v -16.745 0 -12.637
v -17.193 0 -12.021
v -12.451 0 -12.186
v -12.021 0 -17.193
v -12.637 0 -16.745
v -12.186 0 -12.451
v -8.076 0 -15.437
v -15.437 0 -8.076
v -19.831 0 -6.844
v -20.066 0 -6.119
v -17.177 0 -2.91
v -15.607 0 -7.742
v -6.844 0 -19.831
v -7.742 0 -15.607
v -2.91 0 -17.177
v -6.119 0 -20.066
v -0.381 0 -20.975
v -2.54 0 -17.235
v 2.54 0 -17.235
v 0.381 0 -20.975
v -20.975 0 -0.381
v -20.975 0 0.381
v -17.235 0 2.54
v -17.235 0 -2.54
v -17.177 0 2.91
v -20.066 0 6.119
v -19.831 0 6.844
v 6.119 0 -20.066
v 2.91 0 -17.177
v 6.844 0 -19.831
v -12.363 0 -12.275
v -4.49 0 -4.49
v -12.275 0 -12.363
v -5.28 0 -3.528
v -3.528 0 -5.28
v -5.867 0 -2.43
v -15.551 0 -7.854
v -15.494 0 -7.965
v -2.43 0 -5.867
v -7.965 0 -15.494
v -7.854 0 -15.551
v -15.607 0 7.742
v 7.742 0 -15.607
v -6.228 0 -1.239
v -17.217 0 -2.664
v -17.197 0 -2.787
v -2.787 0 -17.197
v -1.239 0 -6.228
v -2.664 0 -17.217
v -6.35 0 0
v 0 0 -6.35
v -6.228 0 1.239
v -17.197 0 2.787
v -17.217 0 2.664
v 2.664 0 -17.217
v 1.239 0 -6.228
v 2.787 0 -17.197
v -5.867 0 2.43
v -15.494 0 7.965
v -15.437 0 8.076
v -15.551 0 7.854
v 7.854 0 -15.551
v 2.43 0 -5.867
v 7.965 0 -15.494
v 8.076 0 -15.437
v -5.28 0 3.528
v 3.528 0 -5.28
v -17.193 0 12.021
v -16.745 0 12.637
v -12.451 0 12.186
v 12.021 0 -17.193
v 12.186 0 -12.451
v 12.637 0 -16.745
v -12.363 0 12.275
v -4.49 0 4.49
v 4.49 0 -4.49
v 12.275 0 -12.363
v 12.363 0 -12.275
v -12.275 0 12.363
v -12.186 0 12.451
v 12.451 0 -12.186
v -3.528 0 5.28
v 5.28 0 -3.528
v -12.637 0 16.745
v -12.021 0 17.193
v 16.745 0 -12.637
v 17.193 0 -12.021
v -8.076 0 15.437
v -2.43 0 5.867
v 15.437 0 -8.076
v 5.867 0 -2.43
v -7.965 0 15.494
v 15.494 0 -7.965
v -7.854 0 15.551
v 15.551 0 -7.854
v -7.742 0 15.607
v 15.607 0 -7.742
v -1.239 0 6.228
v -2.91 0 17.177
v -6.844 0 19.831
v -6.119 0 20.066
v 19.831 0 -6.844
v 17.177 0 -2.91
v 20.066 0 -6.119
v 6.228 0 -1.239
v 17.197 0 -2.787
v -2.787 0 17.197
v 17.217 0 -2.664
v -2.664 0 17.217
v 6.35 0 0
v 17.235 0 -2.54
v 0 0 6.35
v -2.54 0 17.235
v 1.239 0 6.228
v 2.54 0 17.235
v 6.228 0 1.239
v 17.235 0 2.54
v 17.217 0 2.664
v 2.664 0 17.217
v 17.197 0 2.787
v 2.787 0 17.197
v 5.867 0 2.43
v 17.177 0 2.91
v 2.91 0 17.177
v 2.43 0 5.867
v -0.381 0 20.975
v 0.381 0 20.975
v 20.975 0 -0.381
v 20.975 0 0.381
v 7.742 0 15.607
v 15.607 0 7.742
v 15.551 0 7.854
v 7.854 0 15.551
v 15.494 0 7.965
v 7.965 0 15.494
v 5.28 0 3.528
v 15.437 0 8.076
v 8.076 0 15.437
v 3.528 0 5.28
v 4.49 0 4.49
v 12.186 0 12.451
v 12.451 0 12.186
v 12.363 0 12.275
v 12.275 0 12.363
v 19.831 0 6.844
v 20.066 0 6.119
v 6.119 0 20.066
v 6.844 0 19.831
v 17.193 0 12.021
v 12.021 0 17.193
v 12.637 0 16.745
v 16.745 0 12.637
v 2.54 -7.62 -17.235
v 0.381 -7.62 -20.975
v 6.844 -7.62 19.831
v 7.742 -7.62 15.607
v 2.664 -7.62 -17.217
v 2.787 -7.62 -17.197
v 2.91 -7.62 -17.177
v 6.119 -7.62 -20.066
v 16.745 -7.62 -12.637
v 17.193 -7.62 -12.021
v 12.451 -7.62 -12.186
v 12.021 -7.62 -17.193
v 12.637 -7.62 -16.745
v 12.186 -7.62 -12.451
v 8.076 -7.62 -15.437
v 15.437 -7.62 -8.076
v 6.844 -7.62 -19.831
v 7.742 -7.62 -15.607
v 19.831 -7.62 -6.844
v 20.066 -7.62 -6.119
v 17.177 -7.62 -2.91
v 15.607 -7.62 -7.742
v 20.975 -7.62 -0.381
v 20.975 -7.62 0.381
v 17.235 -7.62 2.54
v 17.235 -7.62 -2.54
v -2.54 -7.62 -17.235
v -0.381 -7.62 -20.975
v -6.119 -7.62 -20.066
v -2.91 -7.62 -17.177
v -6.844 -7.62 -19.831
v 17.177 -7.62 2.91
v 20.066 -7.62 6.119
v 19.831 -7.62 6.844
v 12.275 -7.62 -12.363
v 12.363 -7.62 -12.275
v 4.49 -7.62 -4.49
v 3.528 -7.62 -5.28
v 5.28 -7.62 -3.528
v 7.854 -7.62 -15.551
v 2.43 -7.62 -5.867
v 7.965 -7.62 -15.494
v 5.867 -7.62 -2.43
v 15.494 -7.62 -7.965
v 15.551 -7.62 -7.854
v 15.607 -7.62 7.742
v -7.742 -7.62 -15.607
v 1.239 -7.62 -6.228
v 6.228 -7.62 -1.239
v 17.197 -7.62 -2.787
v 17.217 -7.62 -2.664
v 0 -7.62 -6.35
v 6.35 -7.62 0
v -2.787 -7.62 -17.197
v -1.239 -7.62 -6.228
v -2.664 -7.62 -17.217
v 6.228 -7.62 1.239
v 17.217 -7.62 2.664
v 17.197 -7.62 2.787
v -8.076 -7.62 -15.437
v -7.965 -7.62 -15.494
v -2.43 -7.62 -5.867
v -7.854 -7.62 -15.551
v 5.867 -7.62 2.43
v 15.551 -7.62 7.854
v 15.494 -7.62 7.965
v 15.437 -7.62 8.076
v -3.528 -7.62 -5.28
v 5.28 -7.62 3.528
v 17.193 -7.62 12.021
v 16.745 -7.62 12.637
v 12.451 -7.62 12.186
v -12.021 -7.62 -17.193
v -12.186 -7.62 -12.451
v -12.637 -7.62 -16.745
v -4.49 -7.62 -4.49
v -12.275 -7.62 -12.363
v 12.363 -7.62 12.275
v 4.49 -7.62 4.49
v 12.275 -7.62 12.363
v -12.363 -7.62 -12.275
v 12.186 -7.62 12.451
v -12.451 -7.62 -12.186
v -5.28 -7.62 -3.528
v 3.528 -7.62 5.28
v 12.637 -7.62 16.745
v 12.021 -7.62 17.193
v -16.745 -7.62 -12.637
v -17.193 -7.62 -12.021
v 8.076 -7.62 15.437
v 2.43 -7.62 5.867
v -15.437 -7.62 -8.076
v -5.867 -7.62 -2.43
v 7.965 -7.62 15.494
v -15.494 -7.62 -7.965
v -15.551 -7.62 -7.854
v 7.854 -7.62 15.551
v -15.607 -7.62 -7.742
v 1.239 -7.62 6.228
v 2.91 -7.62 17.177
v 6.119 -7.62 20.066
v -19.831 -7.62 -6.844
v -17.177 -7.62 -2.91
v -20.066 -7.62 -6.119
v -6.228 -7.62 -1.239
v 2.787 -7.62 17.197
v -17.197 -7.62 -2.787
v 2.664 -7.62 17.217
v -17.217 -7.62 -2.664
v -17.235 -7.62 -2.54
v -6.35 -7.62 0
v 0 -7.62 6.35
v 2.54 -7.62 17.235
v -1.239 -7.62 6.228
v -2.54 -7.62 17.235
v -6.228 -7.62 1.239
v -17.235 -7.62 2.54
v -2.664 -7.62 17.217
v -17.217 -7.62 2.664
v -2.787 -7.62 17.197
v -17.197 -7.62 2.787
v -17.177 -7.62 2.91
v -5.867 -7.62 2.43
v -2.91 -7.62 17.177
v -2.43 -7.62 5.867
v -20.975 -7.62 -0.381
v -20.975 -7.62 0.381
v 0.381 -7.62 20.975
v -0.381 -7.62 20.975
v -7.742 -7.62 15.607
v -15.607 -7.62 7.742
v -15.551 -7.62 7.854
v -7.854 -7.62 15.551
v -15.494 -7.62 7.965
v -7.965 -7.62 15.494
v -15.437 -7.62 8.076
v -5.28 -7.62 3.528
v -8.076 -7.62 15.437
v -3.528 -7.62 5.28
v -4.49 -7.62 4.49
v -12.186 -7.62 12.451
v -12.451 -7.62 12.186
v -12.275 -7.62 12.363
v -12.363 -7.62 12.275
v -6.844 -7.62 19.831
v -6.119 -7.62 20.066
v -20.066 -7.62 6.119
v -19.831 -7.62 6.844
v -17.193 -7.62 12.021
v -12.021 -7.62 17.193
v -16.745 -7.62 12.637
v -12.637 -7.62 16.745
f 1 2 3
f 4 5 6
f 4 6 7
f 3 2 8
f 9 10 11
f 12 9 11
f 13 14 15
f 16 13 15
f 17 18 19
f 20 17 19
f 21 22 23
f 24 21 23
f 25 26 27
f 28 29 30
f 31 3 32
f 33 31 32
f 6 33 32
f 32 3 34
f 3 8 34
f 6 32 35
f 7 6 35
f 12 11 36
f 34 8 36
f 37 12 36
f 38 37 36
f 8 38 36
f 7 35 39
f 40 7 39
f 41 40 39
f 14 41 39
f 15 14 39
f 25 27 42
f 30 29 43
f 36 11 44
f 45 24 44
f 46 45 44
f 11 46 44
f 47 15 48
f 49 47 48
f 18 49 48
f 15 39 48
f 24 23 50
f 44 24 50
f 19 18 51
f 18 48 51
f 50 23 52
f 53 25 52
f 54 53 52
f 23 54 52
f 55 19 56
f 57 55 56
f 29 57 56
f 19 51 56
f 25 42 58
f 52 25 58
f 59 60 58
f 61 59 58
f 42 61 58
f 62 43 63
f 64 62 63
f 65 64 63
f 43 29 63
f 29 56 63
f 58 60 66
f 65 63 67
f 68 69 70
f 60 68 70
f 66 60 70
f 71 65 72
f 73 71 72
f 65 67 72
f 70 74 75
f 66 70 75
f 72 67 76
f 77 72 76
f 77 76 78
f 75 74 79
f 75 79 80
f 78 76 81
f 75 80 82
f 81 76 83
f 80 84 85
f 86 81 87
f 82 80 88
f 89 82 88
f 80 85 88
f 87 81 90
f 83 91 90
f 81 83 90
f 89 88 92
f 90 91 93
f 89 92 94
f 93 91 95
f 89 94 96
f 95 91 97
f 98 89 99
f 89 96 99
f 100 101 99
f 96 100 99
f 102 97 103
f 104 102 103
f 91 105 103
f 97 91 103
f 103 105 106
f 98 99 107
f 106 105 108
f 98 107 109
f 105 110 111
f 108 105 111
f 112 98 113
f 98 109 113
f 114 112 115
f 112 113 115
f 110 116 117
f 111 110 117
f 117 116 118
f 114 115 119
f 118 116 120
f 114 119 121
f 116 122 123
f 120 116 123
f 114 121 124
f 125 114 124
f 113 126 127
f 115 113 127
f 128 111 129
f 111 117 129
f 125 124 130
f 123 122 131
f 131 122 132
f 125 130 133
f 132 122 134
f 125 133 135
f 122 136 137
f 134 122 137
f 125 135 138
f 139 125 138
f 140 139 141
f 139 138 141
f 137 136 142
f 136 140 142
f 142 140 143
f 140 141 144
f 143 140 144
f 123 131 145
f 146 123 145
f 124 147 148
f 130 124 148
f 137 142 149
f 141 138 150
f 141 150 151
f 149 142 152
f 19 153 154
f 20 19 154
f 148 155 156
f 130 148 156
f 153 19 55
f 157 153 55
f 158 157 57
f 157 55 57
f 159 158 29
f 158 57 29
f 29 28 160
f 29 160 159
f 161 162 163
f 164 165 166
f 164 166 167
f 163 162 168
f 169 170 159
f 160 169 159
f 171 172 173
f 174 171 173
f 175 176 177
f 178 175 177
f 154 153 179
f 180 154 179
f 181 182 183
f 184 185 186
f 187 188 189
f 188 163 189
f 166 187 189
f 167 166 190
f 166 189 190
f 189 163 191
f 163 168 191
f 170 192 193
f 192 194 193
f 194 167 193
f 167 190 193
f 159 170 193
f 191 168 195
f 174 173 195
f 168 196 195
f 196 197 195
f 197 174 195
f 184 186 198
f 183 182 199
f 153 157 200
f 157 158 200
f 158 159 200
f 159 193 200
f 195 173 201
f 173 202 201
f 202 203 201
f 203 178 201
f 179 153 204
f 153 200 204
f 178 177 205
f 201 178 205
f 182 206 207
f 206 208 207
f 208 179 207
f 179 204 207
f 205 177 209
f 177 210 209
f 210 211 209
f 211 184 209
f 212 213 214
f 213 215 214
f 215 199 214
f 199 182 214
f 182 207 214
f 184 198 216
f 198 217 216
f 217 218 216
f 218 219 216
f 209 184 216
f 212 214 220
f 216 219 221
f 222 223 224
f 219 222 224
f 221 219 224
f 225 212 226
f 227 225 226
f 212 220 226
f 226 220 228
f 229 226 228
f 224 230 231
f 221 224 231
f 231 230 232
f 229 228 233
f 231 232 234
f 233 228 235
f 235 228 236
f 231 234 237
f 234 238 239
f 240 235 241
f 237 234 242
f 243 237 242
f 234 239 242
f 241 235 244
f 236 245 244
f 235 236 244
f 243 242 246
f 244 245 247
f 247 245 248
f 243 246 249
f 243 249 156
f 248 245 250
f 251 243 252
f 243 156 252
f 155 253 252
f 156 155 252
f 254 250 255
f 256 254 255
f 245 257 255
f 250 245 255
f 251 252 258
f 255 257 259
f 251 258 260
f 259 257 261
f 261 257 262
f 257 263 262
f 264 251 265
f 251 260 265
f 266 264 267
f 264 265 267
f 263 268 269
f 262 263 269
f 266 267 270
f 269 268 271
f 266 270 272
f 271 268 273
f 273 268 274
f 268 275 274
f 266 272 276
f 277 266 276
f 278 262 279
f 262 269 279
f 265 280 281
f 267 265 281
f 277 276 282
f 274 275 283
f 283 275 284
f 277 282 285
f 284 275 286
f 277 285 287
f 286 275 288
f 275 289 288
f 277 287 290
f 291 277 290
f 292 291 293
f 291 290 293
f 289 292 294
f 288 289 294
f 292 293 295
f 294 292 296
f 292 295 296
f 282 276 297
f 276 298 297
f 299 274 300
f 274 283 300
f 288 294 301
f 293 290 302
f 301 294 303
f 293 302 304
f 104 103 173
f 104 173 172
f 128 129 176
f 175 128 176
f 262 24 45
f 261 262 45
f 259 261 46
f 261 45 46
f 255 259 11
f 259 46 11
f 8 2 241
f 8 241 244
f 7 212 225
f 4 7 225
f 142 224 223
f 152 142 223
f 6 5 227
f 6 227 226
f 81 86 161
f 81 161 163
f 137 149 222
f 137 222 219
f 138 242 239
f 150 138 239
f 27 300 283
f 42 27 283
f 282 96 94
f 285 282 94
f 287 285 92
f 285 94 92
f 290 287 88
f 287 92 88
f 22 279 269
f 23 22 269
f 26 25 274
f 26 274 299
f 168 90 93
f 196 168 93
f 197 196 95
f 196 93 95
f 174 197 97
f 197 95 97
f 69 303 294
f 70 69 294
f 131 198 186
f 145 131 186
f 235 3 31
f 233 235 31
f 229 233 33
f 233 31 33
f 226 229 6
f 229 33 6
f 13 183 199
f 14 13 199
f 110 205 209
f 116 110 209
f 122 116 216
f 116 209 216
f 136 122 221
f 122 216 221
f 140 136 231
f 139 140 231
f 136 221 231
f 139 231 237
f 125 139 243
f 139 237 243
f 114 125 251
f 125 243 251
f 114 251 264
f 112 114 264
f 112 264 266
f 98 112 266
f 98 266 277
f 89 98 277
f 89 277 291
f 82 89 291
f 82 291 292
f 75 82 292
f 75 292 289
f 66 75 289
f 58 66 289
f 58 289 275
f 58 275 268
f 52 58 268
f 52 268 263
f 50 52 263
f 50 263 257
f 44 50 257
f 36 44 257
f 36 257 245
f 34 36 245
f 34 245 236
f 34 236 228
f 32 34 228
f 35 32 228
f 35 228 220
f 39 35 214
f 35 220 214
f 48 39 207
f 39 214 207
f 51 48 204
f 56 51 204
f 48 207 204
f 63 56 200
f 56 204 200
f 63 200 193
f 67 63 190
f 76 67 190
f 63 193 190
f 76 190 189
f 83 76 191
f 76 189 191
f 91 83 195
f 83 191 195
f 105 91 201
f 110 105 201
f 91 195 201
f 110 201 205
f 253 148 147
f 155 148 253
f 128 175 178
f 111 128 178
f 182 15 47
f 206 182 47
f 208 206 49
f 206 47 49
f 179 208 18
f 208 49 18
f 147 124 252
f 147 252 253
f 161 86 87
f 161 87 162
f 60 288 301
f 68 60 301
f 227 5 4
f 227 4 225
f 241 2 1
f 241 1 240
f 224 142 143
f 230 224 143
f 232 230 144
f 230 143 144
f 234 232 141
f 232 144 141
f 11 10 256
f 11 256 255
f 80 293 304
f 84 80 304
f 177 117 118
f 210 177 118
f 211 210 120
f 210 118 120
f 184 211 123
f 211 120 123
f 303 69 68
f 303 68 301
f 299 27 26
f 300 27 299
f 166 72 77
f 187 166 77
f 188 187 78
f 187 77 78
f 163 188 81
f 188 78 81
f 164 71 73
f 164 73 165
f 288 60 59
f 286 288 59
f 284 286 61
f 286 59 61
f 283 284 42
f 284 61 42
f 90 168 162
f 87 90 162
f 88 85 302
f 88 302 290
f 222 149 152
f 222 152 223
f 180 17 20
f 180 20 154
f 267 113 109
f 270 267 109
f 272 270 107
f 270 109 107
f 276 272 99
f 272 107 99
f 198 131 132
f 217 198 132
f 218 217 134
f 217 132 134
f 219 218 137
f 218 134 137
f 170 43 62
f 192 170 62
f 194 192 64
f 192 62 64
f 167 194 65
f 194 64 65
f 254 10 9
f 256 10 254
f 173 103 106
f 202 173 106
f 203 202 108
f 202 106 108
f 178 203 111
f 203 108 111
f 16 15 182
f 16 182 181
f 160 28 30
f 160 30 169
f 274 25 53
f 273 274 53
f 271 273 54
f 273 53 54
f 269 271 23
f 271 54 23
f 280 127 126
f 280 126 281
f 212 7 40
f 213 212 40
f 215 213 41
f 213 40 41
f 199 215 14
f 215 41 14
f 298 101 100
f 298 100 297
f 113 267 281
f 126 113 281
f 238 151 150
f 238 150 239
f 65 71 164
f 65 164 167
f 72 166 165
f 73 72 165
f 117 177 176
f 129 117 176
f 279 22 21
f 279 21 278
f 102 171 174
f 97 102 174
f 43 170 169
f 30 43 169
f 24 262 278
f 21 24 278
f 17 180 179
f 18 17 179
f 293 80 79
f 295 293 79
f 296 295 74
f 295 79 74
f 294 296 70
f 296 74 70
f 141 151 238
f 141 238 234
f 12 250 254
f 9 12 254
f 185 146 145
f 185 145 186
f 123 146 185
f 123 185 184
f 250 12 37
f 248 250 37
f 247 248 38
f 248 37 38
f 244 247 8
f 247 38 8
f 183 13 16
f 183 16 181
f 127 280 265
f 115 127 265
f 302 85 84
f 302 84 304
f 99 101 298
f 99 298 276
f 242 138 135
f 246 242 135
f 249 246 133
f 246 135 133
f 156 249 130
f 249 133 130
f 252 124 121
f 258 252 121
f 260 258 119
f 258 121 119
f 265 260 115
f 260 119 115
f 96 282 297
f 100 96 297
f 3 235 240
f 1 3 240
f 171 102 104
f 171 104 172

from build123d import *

# Parameters (mm, degrees)
F0_R     = 17.421619
F1_DEPTH = 7.62
F3_DEPTH = 7.62
F4_SIZE  = 0.762
F5_R     = 6.35
F6_DEPTH = 25.4


with BuildPart() as f1:
    # F0 (on Front) → F1 (new body)
    with BuildSketch(Plane.XZ):
        Circle(F0_R)
    extrude(amount=F1_DEPTH)

    # F2 (on face) → F3 (join, through all)
    with BuildSketch(Plane(origin=(0, 0, 0), x_dir=(-1, 0, 0), z_dir=(0, 1, 0))):
        Polygon((-17.235463, -2.54), (-17.235463, 2.54), (-21.634872, 0), align=None)
        Polygon((-20.575986, -6.685543), (-15.606996, -7.741735), (-17.176803, -2.910368), align=None)
        Polygon((-17.502979, -12.716659), (-12.450808, -12.185654), (-15.436757, -8.075848), align=None)
        Polygon((-12.716659, -17.502979), (-8.075848, -15.436757), (-12.185654, -12.450808), align=None)
        Polygon((-6.685543, -20.575986), (-2.910368, -17.176803), (-7.741735, -15.606996), align=None)
        Polygon((0, -21.634872), (2.54, -17.235463), (-2.54, -17.235463), align=None)
        Polygon((6.685543, -20.575986), (7.741735, -15.606996), (2.910368, -17.176803), align=None)
        Polygon((12.716659, -17.502979), (12.185654, -12.450808), (8.075848, -15.436757), align=None)
        Polygon((17.502979, -12.716659), (15.436757, -8.075848), (12.450808, -12.185654), align=None)
        Polygon((20.575986, -6.685543), (17.176803, -2.910368), (15.606996, -7.741735), align=None)
        Polygon((21.634872, 0), (17.235463, 2.54), (17.235463, -2.54), align=None)
        Polygon((20.575986, 6.685543), (15.606996, 7.741735), (17.176803, 2.910368), align=None)
        Polygon((17.502979, 12.716659), (12.450808, 12.185654), (15.436757, 8.075848), align=None)
        Polygon((12.716659, 17.502979), (8.075848, 15.436757), (12.185654, 12.450808), align=None)
        Polygon((6.685543, 20.575986), (2.910368, 17.176803), (7.741735, 15.606996), align=None)
        Polygon((0, 21.634872), (-2.54, 17.235463), (2.54, 17.235463), align=None)
        Polygon((-6.685543, 20.575986), (-7.741735, 15.606996), (-2.910368, 17.176803), align=None)
        Polygon((-12.716659, 17.502979), (-12.185654, 12.450808), (-8.075848, 15.436757), align=None)
        Polygon((-17.502979, 12.716659), (-15.436757, 8.075848), (-12.450808, 12.185654), align=None)
        Polygon((-20.575986, 6.685543), (-17.176803, 2.910368), (-15.606996, 7.741735), align=None)
    extrude(amount=-F3_DEPTH)

    # F4
    f4_edges = [f1.edges().sort_by_distance(p)[0] for p in [
        (-6.685543, -3.81, 20.575986),
        (0, -3.81, 21.634872),
        (6.685543, -3.81, 20.575986),
        (12.716659, -3.81, 17.502979),
        (17.502979, -3.81, 12.716659),
        (20.575986, -3.81, 6.685543),
        (21.634872, -3.81, 0),
        (20.575986, -3.81, -6.685543),
        (-12.716659, -3.81, 17.502979),
        (-17.502979, -3.81, 12.716659),
        (-20.575986, -3.81, 6.685543),
        (-21.634872, -3.81, 0),
        (-20.575986, -3.81, -6.685543),
        (-17.502979, -3.81, -12.716659),
        (-12.716659, -3.81, -17.502979),
        (17.502979, -3.81, -12.716659),
        (-6.685543, -3.81, -20.575986),
        (0, -3.81, -21.634872),
        (6.685543, -3.81, -20.575986),
        (12.716659, -3.81, -17.502979),
    ]]
    chamfer(f4_edges, length=F4_SIZE)

    # F5 (on face) → F6 (cut)
    with BuildSketch(Plane.XZ.offset(7.62)):
        Circle(F5_R)
    extrude(amount=-F6_DEPTH, mode=Mode.SUBTRACT)


solid = f1.part
